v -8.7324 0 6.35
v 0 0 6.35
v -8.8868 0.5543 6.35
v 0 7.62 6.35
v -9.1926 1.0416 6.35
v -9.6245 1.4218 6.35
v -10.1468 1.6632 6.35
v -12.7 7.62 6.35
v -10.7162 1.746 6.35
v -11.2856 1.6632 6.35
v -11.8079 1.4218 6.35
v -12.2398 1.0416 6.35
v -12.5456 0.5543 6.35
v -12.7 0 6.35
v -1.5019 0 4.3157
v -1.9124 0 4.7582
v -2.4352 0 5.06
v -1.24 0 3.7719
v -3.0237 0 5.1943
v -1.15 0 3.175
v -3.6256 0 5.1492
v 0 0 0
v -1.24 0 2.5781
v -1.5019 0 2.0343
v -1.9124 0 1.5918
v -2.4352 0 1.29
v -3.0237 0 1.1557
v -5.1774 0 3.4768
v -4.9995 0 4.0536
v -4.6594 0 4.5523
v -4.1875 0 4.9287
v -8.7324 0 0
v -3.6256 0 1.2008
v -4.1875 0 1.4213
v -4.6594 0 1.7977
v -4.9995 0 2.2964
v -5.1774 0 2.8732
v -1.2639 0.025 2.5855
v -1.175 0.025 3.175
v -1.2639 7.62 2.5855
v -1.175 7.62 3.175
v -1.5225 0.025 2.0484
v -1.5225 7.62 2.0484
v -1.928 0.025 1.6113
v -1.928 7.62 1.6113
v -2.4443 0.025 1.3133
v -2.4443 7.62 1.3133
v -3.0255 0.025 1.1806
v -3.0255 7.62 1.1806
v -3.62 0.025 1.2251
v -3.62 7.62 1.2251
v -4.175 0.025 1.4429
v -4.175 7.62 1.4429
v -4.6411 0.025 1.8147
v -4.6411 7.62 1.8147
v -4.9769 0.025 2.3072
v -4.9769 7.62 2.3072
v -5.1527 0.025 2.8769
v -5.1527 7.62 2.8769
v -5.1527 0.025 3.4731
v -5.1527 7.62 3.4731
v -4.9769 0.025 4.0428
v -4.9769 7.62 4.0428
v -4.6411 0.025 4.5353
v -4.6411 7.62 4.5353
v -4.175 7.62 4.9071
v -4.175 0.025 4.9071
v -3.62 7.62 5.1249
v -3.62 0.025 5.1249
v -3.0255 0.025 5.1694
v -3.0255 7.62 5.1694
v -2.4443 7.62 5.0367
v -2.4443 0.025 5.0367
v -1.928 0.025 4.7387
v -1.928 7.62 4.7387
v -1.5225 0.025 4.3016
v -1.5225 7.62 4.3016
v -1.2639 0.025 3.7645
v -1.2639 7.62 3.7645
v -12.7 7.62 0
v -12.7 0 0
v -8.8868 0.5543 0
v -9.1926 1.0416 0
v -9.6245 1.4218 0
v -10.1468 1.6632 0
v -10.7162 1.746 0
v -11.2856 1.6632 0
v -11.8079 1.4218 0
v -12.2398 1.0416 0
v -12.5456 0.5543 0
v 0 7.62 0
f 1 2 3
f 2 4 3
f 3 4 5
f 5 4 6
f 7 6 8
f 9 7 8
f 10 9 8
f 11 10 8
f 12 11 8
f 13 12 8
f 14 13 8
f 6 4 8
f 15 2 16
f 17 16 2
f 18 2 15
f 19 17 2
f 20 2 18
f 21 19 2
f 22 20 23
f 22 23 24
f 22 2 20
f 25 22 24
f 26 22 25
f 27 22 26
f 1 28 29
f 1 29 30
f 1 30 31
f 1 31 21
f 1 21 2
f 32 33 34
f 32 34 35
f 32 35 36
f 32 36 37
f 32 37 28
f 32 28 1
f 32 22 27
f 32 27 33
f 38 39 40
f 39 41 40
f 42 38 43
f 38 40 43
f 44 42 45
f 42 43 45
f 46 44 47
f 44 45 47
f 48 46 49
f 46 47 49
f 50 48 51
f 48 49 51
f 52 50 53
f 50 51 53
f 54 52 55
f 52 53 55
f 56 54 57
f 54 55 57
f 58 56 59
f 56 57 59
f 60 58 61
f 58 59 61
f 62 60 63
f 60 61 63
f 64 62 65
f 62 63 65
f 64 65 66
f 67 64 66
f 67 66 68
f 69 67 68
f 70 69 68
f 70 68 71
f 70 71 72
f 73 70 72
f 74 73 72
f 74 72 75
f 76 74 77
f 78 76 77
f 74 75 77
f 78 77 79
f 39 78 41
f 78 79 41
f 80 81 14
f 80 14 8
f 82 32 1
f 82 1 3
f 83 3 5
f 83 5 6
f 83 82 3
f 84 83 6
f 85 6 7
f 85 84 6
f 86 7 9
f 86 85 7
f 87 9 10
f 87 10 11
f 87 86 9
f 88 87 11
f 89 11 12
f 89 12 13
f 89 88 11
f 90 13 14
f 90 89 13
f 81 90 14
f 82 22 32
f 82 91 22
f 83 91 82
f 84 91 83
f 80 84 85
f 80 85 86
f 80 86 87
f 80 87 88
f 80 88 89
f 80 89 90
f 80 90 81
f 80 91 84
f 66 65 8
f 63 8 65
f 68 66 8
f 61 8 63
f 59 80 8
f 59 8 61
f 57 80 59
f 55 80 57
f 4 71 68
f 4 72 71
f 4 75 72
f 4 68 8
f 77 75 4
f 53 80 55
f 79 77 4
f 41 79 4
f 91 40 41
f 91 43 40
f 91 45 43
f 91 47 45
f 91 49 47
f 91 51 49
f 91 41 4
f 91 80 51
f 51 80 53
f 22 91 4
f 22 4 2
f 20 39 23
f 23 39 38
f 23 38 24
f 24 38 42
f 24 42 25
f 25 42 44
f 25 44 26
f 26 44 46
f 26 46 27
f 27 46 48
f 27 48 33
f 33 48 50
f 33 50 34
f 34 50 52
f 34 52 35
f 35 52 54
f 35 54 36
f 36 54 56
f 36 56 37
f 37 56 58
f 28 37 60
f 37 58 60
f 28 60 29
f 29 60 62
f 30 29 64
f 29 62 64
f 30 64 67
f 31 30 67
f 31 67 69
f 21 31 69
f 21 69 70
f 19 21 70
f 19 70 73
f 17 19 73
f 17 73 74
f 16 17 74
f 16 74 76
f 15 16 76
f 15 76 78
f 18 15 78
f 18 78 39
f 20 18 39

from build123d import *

# Parameters (mm, degrees)
BOSS_EXTRUDE1_DEPTH             = 6.35
F_4_0MM_DOWEL_HOLE1_D           = 4
F_4_0MM_DOWEL_HOLE1_CSINK_D     = 4.05
F_4_0MM_DOWEL_HOLE1_CSINK_ANGLE = 90


with BuildPart() as part:
    # Sketch1 → Boss-Extrude1 (new body)
    with BuildSketch(Plane.XY):
        with BuildLine():
            Line((0, 0), (-8.732389132, 0))
            ThreePointArc((-8.732389132, 0), (-10.716194566, 1.746), (-12.7, 0))
            Line((-12.7, 0), (-12.7, 7.62))
            Line((-12.7, 7.62), (0, 7.62))
            Line((0, 7.62), (0, 0))
        make_face()
    extrude(amount=BOSS_EXTRUDE1_DEPTH)

    # Ø4.0mm Dowel Hole1 (through all)
    with Locations(Plane(origin=(0, 0, 0), x_dir=(-1, 0, 0), z_dir=(0, -1, 0))):
        with Locations((3.175, -3.175)):
            CounterSinkHole(F_4_0MM_DOWEL_HOLE1_D / 2, F_4_0MM_DOWEL_HOLE1_CSINK_D / 2, counter_sink_angle=F_4_0MM_DOWEL_HOLE1_CSINK_ANGLE)


solid = part.part
